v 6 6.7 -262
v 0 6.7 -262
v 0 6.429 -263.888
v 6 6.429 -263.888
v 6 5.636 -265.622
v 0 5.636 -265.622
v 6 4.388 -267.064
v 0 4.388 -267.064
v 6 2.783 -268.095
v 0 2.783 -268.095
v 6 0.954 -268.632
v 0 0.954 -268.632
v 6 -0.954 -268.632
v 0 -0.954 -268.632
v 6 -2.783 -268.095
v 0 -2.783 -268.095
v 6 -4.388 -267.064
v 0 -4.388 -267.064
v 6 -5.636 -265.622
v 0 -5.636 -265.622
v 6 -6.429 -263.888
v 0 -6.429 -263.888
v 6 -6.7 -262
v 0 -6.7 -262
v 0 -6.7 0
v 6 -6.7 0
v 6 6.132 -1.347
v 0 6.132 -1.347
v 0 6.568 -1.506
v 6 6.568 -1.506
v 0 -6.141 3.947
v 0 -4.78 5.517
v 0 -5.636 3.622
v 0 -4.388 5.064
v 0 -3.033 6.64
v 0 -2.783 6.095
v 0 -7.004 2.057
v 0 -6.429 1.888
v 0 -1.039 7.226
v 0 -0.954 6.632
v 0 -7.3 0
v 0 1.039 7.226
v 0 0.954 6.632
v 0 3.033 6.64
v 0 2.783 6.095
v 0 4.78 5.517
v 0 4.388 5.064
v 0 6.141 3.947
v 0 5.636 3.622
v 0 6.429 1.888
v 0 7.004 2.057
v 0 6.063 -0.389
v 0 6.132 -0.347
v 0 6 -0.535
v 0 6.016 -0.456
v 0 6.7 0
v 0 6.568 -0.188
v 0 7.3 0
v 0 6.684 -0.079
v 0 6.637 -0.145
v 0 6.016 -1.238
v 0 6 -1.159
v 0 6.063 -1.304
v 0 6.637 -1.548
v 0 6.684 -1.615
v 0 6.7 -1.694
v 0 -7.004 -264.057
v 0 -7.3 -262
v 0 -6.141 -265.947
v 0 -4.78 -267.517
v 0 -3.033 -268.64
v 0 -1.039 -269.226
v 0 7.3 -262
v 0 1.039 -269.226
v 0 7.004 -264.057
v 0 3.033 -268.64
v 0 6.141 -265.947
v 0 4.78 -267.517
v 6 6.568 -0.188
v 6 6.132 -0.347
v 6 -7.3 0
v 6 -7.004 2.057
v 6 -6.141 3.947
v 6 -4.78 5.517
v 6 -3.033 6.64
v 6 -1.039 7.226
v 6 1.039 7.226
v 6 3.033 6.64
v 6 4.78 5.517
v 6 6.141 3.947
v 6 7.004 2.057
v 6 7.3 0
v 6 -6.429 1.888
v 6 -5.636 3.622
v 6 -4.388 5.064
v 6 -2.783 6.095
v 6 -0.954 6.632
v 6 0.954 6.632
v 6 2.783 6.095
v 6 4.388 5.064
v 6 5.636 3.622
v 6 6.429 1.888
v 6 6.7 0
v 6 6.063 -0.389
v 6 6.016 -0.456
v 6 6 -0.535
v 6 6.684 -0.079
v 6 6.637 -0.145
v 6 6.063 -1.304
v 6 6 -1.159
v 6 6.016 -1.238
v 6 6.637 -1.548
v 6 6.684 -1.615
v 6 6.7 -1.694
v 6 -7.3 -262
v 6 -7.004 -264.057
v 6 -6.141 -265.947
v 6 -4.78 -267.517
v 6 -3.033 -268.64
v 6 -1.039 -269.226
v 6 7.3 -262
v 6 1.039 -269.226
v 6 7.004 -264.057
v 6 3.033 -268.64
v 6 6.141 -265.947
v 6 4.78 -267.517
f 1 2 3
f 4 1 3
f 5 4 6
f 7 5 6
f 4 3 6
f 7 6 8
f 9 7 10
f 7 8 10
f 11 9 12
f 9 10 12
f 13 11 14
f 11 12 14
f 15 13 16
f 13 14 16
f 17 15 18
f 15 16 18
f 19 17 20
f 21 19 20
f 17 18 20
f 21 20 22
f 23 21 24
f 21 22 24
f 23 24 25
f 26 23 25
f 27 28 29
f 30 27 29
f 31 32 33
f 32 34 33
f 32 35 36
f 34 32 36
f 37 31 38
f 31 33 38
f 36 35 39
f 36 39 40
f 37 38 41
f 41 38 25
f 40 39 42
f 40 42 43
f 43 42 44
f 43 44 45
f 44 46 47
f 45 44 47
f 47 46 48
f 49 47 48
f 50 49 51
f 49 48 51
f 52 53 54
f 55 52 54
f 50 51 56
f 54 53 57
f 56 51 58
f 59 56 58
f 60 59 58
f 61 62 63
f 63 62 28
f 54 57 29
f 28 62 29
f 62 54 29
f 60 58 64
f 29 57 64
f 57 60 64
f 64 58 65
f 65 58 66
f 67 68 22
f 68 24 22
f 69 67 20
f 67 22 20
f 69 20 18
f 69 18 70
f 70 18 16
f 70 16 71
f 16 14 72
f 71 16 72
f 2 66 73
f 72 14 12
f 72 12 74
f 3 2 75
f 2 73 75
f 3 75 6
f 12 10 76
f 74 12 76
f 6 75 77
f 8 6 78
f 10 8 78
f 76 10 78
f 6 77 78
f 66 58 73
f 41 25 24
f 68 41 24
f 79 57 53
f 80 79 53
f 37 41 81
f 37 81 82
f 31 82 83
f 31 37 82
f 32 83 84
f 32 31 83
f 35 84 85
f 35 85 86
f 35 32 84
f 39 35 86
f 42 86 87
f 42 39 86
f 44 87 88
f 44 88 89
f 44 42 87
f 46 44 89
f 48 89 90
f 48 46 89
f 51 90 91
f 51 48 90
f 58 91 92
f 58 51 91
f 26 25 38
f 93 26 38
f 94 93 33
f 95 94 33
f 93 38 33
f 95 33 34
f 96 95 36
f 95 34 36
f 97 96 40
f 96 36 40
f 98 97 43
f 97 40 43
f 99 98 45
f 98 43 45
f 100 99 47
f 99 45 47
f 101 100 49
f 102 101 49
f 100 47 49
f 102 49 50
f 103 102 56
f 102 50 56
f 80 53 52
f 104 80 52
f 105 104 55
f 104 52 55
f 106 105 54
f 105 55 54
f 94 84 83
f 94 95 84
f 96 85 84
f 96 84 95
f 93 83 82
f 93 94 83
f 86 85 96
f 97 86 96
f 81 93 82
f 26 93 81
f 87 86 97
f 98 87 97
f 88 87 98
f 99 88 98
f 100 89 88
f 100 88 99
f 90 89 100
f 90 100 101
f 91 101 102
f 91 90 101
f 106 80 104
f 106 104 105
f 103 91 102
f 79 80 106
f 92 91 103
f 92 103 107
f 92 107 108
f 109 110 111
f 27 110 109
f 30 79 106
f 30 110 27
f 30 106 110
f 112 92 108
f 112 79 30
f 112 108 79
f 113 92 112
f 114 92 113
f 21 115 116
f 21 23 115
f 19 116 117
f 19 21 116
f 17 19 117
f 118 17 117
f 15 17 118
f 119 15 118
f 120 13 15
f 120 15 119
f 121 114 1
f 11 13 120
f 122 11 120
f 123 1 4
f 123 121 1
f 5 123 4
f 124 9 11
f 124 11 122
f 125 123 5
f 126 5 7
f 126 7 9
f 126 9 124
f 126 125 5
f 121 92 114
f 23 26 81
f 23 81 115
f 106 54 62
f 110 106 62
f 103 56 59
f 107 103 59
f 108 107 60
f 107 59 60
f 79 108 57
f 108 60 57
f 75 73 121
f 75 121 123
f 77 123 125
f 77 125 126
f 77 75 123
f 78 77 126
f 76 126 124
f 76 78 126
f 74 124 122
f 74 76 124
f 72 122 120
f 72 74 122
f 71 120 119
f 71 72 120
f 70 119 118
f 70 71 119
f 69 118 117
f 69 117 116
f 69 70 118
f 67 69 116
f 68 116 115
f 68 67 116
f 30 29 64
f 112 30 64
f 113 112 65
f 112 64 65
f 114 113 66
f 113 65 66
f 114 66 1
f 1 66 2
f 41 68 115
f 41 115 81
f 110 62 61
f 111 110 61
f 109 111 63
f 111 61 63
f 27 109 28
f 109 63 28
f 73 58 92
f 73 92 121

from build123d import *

# Parameters (mm, degrees)
BOSS_EXTRUDE1_DEPTH = 6
BOSS_EXTRUDE2_DEPTH = 6


with BuildPart() as part:
    # Sketch1 → Boss-Extrude1 (new body)
    with BuildSketch(Plane(origin=(0, 0, 0), x_dir=(0, 0, -1), z_dir=(1, 0, 0))):
        with BuildLine():
            Line((0, 7.3), (262, 7.3))
            ThreePointArc((262, 7.3), (269.3, 0), (262, -7.3))
            Line((262, -7.3), (0, -7.3))
            ThreePointArc((0, -7.3), (-7.3, 0), (0, 7.3))
        make_face()
        with BuildLine():
            Line((0, 6.7), (262, 6.7))
            ThreePointArc((262, 6.7), (268.7, 0), (262, -6.7))
            Line((262, -6.7), (0, -6.7))
            ThreePointArc((0, -6.7), (-6.7, 0), (0, 6.7))
        make_face(mode=Mode.SUBTRACT)
    extrude(amount=BOSS_EXTRUDE1_DEPTH)

    # Sketch2 → Boss-Extrude2 (add, through all)
    with BuildSketch(Plane(origin=(0, 0, 0), x_dir=(0, 0, -1), z_dir=(1, 0, 0))):
        with BuildLine():
            Line((0.187938524, 6.568404029), (0.346923655, 6.131595971))
            ThreePointArc((0.346923655, 6.131595971), (0.420146892, 6.036169591), (0.534862179, 6))
            Line((0.534862179, 6), (1.158985131, 6))
            ThreePointArc((1.158985131, 6), (1.273700418, 6.036169591), (1.346923655, 6.131595971))
            Line((1.346923655, 6.131595971), (1.505908786, 6.568404029))
            ThreePointArc((1.505908786, 6.568404029), (1.579132023, 6.663830409), (1.69384731, 6.7))
            Line((1.69384731, 6.7), (0, 6.7))
            ThreePointArc((0, 6.7), (0.114715287, 6.663830409), (0.187938524, 6.568404029))
        make_face()
    extrude(amount=BOSS_EXTRUDE2_DEPTH)


solid = part.part
